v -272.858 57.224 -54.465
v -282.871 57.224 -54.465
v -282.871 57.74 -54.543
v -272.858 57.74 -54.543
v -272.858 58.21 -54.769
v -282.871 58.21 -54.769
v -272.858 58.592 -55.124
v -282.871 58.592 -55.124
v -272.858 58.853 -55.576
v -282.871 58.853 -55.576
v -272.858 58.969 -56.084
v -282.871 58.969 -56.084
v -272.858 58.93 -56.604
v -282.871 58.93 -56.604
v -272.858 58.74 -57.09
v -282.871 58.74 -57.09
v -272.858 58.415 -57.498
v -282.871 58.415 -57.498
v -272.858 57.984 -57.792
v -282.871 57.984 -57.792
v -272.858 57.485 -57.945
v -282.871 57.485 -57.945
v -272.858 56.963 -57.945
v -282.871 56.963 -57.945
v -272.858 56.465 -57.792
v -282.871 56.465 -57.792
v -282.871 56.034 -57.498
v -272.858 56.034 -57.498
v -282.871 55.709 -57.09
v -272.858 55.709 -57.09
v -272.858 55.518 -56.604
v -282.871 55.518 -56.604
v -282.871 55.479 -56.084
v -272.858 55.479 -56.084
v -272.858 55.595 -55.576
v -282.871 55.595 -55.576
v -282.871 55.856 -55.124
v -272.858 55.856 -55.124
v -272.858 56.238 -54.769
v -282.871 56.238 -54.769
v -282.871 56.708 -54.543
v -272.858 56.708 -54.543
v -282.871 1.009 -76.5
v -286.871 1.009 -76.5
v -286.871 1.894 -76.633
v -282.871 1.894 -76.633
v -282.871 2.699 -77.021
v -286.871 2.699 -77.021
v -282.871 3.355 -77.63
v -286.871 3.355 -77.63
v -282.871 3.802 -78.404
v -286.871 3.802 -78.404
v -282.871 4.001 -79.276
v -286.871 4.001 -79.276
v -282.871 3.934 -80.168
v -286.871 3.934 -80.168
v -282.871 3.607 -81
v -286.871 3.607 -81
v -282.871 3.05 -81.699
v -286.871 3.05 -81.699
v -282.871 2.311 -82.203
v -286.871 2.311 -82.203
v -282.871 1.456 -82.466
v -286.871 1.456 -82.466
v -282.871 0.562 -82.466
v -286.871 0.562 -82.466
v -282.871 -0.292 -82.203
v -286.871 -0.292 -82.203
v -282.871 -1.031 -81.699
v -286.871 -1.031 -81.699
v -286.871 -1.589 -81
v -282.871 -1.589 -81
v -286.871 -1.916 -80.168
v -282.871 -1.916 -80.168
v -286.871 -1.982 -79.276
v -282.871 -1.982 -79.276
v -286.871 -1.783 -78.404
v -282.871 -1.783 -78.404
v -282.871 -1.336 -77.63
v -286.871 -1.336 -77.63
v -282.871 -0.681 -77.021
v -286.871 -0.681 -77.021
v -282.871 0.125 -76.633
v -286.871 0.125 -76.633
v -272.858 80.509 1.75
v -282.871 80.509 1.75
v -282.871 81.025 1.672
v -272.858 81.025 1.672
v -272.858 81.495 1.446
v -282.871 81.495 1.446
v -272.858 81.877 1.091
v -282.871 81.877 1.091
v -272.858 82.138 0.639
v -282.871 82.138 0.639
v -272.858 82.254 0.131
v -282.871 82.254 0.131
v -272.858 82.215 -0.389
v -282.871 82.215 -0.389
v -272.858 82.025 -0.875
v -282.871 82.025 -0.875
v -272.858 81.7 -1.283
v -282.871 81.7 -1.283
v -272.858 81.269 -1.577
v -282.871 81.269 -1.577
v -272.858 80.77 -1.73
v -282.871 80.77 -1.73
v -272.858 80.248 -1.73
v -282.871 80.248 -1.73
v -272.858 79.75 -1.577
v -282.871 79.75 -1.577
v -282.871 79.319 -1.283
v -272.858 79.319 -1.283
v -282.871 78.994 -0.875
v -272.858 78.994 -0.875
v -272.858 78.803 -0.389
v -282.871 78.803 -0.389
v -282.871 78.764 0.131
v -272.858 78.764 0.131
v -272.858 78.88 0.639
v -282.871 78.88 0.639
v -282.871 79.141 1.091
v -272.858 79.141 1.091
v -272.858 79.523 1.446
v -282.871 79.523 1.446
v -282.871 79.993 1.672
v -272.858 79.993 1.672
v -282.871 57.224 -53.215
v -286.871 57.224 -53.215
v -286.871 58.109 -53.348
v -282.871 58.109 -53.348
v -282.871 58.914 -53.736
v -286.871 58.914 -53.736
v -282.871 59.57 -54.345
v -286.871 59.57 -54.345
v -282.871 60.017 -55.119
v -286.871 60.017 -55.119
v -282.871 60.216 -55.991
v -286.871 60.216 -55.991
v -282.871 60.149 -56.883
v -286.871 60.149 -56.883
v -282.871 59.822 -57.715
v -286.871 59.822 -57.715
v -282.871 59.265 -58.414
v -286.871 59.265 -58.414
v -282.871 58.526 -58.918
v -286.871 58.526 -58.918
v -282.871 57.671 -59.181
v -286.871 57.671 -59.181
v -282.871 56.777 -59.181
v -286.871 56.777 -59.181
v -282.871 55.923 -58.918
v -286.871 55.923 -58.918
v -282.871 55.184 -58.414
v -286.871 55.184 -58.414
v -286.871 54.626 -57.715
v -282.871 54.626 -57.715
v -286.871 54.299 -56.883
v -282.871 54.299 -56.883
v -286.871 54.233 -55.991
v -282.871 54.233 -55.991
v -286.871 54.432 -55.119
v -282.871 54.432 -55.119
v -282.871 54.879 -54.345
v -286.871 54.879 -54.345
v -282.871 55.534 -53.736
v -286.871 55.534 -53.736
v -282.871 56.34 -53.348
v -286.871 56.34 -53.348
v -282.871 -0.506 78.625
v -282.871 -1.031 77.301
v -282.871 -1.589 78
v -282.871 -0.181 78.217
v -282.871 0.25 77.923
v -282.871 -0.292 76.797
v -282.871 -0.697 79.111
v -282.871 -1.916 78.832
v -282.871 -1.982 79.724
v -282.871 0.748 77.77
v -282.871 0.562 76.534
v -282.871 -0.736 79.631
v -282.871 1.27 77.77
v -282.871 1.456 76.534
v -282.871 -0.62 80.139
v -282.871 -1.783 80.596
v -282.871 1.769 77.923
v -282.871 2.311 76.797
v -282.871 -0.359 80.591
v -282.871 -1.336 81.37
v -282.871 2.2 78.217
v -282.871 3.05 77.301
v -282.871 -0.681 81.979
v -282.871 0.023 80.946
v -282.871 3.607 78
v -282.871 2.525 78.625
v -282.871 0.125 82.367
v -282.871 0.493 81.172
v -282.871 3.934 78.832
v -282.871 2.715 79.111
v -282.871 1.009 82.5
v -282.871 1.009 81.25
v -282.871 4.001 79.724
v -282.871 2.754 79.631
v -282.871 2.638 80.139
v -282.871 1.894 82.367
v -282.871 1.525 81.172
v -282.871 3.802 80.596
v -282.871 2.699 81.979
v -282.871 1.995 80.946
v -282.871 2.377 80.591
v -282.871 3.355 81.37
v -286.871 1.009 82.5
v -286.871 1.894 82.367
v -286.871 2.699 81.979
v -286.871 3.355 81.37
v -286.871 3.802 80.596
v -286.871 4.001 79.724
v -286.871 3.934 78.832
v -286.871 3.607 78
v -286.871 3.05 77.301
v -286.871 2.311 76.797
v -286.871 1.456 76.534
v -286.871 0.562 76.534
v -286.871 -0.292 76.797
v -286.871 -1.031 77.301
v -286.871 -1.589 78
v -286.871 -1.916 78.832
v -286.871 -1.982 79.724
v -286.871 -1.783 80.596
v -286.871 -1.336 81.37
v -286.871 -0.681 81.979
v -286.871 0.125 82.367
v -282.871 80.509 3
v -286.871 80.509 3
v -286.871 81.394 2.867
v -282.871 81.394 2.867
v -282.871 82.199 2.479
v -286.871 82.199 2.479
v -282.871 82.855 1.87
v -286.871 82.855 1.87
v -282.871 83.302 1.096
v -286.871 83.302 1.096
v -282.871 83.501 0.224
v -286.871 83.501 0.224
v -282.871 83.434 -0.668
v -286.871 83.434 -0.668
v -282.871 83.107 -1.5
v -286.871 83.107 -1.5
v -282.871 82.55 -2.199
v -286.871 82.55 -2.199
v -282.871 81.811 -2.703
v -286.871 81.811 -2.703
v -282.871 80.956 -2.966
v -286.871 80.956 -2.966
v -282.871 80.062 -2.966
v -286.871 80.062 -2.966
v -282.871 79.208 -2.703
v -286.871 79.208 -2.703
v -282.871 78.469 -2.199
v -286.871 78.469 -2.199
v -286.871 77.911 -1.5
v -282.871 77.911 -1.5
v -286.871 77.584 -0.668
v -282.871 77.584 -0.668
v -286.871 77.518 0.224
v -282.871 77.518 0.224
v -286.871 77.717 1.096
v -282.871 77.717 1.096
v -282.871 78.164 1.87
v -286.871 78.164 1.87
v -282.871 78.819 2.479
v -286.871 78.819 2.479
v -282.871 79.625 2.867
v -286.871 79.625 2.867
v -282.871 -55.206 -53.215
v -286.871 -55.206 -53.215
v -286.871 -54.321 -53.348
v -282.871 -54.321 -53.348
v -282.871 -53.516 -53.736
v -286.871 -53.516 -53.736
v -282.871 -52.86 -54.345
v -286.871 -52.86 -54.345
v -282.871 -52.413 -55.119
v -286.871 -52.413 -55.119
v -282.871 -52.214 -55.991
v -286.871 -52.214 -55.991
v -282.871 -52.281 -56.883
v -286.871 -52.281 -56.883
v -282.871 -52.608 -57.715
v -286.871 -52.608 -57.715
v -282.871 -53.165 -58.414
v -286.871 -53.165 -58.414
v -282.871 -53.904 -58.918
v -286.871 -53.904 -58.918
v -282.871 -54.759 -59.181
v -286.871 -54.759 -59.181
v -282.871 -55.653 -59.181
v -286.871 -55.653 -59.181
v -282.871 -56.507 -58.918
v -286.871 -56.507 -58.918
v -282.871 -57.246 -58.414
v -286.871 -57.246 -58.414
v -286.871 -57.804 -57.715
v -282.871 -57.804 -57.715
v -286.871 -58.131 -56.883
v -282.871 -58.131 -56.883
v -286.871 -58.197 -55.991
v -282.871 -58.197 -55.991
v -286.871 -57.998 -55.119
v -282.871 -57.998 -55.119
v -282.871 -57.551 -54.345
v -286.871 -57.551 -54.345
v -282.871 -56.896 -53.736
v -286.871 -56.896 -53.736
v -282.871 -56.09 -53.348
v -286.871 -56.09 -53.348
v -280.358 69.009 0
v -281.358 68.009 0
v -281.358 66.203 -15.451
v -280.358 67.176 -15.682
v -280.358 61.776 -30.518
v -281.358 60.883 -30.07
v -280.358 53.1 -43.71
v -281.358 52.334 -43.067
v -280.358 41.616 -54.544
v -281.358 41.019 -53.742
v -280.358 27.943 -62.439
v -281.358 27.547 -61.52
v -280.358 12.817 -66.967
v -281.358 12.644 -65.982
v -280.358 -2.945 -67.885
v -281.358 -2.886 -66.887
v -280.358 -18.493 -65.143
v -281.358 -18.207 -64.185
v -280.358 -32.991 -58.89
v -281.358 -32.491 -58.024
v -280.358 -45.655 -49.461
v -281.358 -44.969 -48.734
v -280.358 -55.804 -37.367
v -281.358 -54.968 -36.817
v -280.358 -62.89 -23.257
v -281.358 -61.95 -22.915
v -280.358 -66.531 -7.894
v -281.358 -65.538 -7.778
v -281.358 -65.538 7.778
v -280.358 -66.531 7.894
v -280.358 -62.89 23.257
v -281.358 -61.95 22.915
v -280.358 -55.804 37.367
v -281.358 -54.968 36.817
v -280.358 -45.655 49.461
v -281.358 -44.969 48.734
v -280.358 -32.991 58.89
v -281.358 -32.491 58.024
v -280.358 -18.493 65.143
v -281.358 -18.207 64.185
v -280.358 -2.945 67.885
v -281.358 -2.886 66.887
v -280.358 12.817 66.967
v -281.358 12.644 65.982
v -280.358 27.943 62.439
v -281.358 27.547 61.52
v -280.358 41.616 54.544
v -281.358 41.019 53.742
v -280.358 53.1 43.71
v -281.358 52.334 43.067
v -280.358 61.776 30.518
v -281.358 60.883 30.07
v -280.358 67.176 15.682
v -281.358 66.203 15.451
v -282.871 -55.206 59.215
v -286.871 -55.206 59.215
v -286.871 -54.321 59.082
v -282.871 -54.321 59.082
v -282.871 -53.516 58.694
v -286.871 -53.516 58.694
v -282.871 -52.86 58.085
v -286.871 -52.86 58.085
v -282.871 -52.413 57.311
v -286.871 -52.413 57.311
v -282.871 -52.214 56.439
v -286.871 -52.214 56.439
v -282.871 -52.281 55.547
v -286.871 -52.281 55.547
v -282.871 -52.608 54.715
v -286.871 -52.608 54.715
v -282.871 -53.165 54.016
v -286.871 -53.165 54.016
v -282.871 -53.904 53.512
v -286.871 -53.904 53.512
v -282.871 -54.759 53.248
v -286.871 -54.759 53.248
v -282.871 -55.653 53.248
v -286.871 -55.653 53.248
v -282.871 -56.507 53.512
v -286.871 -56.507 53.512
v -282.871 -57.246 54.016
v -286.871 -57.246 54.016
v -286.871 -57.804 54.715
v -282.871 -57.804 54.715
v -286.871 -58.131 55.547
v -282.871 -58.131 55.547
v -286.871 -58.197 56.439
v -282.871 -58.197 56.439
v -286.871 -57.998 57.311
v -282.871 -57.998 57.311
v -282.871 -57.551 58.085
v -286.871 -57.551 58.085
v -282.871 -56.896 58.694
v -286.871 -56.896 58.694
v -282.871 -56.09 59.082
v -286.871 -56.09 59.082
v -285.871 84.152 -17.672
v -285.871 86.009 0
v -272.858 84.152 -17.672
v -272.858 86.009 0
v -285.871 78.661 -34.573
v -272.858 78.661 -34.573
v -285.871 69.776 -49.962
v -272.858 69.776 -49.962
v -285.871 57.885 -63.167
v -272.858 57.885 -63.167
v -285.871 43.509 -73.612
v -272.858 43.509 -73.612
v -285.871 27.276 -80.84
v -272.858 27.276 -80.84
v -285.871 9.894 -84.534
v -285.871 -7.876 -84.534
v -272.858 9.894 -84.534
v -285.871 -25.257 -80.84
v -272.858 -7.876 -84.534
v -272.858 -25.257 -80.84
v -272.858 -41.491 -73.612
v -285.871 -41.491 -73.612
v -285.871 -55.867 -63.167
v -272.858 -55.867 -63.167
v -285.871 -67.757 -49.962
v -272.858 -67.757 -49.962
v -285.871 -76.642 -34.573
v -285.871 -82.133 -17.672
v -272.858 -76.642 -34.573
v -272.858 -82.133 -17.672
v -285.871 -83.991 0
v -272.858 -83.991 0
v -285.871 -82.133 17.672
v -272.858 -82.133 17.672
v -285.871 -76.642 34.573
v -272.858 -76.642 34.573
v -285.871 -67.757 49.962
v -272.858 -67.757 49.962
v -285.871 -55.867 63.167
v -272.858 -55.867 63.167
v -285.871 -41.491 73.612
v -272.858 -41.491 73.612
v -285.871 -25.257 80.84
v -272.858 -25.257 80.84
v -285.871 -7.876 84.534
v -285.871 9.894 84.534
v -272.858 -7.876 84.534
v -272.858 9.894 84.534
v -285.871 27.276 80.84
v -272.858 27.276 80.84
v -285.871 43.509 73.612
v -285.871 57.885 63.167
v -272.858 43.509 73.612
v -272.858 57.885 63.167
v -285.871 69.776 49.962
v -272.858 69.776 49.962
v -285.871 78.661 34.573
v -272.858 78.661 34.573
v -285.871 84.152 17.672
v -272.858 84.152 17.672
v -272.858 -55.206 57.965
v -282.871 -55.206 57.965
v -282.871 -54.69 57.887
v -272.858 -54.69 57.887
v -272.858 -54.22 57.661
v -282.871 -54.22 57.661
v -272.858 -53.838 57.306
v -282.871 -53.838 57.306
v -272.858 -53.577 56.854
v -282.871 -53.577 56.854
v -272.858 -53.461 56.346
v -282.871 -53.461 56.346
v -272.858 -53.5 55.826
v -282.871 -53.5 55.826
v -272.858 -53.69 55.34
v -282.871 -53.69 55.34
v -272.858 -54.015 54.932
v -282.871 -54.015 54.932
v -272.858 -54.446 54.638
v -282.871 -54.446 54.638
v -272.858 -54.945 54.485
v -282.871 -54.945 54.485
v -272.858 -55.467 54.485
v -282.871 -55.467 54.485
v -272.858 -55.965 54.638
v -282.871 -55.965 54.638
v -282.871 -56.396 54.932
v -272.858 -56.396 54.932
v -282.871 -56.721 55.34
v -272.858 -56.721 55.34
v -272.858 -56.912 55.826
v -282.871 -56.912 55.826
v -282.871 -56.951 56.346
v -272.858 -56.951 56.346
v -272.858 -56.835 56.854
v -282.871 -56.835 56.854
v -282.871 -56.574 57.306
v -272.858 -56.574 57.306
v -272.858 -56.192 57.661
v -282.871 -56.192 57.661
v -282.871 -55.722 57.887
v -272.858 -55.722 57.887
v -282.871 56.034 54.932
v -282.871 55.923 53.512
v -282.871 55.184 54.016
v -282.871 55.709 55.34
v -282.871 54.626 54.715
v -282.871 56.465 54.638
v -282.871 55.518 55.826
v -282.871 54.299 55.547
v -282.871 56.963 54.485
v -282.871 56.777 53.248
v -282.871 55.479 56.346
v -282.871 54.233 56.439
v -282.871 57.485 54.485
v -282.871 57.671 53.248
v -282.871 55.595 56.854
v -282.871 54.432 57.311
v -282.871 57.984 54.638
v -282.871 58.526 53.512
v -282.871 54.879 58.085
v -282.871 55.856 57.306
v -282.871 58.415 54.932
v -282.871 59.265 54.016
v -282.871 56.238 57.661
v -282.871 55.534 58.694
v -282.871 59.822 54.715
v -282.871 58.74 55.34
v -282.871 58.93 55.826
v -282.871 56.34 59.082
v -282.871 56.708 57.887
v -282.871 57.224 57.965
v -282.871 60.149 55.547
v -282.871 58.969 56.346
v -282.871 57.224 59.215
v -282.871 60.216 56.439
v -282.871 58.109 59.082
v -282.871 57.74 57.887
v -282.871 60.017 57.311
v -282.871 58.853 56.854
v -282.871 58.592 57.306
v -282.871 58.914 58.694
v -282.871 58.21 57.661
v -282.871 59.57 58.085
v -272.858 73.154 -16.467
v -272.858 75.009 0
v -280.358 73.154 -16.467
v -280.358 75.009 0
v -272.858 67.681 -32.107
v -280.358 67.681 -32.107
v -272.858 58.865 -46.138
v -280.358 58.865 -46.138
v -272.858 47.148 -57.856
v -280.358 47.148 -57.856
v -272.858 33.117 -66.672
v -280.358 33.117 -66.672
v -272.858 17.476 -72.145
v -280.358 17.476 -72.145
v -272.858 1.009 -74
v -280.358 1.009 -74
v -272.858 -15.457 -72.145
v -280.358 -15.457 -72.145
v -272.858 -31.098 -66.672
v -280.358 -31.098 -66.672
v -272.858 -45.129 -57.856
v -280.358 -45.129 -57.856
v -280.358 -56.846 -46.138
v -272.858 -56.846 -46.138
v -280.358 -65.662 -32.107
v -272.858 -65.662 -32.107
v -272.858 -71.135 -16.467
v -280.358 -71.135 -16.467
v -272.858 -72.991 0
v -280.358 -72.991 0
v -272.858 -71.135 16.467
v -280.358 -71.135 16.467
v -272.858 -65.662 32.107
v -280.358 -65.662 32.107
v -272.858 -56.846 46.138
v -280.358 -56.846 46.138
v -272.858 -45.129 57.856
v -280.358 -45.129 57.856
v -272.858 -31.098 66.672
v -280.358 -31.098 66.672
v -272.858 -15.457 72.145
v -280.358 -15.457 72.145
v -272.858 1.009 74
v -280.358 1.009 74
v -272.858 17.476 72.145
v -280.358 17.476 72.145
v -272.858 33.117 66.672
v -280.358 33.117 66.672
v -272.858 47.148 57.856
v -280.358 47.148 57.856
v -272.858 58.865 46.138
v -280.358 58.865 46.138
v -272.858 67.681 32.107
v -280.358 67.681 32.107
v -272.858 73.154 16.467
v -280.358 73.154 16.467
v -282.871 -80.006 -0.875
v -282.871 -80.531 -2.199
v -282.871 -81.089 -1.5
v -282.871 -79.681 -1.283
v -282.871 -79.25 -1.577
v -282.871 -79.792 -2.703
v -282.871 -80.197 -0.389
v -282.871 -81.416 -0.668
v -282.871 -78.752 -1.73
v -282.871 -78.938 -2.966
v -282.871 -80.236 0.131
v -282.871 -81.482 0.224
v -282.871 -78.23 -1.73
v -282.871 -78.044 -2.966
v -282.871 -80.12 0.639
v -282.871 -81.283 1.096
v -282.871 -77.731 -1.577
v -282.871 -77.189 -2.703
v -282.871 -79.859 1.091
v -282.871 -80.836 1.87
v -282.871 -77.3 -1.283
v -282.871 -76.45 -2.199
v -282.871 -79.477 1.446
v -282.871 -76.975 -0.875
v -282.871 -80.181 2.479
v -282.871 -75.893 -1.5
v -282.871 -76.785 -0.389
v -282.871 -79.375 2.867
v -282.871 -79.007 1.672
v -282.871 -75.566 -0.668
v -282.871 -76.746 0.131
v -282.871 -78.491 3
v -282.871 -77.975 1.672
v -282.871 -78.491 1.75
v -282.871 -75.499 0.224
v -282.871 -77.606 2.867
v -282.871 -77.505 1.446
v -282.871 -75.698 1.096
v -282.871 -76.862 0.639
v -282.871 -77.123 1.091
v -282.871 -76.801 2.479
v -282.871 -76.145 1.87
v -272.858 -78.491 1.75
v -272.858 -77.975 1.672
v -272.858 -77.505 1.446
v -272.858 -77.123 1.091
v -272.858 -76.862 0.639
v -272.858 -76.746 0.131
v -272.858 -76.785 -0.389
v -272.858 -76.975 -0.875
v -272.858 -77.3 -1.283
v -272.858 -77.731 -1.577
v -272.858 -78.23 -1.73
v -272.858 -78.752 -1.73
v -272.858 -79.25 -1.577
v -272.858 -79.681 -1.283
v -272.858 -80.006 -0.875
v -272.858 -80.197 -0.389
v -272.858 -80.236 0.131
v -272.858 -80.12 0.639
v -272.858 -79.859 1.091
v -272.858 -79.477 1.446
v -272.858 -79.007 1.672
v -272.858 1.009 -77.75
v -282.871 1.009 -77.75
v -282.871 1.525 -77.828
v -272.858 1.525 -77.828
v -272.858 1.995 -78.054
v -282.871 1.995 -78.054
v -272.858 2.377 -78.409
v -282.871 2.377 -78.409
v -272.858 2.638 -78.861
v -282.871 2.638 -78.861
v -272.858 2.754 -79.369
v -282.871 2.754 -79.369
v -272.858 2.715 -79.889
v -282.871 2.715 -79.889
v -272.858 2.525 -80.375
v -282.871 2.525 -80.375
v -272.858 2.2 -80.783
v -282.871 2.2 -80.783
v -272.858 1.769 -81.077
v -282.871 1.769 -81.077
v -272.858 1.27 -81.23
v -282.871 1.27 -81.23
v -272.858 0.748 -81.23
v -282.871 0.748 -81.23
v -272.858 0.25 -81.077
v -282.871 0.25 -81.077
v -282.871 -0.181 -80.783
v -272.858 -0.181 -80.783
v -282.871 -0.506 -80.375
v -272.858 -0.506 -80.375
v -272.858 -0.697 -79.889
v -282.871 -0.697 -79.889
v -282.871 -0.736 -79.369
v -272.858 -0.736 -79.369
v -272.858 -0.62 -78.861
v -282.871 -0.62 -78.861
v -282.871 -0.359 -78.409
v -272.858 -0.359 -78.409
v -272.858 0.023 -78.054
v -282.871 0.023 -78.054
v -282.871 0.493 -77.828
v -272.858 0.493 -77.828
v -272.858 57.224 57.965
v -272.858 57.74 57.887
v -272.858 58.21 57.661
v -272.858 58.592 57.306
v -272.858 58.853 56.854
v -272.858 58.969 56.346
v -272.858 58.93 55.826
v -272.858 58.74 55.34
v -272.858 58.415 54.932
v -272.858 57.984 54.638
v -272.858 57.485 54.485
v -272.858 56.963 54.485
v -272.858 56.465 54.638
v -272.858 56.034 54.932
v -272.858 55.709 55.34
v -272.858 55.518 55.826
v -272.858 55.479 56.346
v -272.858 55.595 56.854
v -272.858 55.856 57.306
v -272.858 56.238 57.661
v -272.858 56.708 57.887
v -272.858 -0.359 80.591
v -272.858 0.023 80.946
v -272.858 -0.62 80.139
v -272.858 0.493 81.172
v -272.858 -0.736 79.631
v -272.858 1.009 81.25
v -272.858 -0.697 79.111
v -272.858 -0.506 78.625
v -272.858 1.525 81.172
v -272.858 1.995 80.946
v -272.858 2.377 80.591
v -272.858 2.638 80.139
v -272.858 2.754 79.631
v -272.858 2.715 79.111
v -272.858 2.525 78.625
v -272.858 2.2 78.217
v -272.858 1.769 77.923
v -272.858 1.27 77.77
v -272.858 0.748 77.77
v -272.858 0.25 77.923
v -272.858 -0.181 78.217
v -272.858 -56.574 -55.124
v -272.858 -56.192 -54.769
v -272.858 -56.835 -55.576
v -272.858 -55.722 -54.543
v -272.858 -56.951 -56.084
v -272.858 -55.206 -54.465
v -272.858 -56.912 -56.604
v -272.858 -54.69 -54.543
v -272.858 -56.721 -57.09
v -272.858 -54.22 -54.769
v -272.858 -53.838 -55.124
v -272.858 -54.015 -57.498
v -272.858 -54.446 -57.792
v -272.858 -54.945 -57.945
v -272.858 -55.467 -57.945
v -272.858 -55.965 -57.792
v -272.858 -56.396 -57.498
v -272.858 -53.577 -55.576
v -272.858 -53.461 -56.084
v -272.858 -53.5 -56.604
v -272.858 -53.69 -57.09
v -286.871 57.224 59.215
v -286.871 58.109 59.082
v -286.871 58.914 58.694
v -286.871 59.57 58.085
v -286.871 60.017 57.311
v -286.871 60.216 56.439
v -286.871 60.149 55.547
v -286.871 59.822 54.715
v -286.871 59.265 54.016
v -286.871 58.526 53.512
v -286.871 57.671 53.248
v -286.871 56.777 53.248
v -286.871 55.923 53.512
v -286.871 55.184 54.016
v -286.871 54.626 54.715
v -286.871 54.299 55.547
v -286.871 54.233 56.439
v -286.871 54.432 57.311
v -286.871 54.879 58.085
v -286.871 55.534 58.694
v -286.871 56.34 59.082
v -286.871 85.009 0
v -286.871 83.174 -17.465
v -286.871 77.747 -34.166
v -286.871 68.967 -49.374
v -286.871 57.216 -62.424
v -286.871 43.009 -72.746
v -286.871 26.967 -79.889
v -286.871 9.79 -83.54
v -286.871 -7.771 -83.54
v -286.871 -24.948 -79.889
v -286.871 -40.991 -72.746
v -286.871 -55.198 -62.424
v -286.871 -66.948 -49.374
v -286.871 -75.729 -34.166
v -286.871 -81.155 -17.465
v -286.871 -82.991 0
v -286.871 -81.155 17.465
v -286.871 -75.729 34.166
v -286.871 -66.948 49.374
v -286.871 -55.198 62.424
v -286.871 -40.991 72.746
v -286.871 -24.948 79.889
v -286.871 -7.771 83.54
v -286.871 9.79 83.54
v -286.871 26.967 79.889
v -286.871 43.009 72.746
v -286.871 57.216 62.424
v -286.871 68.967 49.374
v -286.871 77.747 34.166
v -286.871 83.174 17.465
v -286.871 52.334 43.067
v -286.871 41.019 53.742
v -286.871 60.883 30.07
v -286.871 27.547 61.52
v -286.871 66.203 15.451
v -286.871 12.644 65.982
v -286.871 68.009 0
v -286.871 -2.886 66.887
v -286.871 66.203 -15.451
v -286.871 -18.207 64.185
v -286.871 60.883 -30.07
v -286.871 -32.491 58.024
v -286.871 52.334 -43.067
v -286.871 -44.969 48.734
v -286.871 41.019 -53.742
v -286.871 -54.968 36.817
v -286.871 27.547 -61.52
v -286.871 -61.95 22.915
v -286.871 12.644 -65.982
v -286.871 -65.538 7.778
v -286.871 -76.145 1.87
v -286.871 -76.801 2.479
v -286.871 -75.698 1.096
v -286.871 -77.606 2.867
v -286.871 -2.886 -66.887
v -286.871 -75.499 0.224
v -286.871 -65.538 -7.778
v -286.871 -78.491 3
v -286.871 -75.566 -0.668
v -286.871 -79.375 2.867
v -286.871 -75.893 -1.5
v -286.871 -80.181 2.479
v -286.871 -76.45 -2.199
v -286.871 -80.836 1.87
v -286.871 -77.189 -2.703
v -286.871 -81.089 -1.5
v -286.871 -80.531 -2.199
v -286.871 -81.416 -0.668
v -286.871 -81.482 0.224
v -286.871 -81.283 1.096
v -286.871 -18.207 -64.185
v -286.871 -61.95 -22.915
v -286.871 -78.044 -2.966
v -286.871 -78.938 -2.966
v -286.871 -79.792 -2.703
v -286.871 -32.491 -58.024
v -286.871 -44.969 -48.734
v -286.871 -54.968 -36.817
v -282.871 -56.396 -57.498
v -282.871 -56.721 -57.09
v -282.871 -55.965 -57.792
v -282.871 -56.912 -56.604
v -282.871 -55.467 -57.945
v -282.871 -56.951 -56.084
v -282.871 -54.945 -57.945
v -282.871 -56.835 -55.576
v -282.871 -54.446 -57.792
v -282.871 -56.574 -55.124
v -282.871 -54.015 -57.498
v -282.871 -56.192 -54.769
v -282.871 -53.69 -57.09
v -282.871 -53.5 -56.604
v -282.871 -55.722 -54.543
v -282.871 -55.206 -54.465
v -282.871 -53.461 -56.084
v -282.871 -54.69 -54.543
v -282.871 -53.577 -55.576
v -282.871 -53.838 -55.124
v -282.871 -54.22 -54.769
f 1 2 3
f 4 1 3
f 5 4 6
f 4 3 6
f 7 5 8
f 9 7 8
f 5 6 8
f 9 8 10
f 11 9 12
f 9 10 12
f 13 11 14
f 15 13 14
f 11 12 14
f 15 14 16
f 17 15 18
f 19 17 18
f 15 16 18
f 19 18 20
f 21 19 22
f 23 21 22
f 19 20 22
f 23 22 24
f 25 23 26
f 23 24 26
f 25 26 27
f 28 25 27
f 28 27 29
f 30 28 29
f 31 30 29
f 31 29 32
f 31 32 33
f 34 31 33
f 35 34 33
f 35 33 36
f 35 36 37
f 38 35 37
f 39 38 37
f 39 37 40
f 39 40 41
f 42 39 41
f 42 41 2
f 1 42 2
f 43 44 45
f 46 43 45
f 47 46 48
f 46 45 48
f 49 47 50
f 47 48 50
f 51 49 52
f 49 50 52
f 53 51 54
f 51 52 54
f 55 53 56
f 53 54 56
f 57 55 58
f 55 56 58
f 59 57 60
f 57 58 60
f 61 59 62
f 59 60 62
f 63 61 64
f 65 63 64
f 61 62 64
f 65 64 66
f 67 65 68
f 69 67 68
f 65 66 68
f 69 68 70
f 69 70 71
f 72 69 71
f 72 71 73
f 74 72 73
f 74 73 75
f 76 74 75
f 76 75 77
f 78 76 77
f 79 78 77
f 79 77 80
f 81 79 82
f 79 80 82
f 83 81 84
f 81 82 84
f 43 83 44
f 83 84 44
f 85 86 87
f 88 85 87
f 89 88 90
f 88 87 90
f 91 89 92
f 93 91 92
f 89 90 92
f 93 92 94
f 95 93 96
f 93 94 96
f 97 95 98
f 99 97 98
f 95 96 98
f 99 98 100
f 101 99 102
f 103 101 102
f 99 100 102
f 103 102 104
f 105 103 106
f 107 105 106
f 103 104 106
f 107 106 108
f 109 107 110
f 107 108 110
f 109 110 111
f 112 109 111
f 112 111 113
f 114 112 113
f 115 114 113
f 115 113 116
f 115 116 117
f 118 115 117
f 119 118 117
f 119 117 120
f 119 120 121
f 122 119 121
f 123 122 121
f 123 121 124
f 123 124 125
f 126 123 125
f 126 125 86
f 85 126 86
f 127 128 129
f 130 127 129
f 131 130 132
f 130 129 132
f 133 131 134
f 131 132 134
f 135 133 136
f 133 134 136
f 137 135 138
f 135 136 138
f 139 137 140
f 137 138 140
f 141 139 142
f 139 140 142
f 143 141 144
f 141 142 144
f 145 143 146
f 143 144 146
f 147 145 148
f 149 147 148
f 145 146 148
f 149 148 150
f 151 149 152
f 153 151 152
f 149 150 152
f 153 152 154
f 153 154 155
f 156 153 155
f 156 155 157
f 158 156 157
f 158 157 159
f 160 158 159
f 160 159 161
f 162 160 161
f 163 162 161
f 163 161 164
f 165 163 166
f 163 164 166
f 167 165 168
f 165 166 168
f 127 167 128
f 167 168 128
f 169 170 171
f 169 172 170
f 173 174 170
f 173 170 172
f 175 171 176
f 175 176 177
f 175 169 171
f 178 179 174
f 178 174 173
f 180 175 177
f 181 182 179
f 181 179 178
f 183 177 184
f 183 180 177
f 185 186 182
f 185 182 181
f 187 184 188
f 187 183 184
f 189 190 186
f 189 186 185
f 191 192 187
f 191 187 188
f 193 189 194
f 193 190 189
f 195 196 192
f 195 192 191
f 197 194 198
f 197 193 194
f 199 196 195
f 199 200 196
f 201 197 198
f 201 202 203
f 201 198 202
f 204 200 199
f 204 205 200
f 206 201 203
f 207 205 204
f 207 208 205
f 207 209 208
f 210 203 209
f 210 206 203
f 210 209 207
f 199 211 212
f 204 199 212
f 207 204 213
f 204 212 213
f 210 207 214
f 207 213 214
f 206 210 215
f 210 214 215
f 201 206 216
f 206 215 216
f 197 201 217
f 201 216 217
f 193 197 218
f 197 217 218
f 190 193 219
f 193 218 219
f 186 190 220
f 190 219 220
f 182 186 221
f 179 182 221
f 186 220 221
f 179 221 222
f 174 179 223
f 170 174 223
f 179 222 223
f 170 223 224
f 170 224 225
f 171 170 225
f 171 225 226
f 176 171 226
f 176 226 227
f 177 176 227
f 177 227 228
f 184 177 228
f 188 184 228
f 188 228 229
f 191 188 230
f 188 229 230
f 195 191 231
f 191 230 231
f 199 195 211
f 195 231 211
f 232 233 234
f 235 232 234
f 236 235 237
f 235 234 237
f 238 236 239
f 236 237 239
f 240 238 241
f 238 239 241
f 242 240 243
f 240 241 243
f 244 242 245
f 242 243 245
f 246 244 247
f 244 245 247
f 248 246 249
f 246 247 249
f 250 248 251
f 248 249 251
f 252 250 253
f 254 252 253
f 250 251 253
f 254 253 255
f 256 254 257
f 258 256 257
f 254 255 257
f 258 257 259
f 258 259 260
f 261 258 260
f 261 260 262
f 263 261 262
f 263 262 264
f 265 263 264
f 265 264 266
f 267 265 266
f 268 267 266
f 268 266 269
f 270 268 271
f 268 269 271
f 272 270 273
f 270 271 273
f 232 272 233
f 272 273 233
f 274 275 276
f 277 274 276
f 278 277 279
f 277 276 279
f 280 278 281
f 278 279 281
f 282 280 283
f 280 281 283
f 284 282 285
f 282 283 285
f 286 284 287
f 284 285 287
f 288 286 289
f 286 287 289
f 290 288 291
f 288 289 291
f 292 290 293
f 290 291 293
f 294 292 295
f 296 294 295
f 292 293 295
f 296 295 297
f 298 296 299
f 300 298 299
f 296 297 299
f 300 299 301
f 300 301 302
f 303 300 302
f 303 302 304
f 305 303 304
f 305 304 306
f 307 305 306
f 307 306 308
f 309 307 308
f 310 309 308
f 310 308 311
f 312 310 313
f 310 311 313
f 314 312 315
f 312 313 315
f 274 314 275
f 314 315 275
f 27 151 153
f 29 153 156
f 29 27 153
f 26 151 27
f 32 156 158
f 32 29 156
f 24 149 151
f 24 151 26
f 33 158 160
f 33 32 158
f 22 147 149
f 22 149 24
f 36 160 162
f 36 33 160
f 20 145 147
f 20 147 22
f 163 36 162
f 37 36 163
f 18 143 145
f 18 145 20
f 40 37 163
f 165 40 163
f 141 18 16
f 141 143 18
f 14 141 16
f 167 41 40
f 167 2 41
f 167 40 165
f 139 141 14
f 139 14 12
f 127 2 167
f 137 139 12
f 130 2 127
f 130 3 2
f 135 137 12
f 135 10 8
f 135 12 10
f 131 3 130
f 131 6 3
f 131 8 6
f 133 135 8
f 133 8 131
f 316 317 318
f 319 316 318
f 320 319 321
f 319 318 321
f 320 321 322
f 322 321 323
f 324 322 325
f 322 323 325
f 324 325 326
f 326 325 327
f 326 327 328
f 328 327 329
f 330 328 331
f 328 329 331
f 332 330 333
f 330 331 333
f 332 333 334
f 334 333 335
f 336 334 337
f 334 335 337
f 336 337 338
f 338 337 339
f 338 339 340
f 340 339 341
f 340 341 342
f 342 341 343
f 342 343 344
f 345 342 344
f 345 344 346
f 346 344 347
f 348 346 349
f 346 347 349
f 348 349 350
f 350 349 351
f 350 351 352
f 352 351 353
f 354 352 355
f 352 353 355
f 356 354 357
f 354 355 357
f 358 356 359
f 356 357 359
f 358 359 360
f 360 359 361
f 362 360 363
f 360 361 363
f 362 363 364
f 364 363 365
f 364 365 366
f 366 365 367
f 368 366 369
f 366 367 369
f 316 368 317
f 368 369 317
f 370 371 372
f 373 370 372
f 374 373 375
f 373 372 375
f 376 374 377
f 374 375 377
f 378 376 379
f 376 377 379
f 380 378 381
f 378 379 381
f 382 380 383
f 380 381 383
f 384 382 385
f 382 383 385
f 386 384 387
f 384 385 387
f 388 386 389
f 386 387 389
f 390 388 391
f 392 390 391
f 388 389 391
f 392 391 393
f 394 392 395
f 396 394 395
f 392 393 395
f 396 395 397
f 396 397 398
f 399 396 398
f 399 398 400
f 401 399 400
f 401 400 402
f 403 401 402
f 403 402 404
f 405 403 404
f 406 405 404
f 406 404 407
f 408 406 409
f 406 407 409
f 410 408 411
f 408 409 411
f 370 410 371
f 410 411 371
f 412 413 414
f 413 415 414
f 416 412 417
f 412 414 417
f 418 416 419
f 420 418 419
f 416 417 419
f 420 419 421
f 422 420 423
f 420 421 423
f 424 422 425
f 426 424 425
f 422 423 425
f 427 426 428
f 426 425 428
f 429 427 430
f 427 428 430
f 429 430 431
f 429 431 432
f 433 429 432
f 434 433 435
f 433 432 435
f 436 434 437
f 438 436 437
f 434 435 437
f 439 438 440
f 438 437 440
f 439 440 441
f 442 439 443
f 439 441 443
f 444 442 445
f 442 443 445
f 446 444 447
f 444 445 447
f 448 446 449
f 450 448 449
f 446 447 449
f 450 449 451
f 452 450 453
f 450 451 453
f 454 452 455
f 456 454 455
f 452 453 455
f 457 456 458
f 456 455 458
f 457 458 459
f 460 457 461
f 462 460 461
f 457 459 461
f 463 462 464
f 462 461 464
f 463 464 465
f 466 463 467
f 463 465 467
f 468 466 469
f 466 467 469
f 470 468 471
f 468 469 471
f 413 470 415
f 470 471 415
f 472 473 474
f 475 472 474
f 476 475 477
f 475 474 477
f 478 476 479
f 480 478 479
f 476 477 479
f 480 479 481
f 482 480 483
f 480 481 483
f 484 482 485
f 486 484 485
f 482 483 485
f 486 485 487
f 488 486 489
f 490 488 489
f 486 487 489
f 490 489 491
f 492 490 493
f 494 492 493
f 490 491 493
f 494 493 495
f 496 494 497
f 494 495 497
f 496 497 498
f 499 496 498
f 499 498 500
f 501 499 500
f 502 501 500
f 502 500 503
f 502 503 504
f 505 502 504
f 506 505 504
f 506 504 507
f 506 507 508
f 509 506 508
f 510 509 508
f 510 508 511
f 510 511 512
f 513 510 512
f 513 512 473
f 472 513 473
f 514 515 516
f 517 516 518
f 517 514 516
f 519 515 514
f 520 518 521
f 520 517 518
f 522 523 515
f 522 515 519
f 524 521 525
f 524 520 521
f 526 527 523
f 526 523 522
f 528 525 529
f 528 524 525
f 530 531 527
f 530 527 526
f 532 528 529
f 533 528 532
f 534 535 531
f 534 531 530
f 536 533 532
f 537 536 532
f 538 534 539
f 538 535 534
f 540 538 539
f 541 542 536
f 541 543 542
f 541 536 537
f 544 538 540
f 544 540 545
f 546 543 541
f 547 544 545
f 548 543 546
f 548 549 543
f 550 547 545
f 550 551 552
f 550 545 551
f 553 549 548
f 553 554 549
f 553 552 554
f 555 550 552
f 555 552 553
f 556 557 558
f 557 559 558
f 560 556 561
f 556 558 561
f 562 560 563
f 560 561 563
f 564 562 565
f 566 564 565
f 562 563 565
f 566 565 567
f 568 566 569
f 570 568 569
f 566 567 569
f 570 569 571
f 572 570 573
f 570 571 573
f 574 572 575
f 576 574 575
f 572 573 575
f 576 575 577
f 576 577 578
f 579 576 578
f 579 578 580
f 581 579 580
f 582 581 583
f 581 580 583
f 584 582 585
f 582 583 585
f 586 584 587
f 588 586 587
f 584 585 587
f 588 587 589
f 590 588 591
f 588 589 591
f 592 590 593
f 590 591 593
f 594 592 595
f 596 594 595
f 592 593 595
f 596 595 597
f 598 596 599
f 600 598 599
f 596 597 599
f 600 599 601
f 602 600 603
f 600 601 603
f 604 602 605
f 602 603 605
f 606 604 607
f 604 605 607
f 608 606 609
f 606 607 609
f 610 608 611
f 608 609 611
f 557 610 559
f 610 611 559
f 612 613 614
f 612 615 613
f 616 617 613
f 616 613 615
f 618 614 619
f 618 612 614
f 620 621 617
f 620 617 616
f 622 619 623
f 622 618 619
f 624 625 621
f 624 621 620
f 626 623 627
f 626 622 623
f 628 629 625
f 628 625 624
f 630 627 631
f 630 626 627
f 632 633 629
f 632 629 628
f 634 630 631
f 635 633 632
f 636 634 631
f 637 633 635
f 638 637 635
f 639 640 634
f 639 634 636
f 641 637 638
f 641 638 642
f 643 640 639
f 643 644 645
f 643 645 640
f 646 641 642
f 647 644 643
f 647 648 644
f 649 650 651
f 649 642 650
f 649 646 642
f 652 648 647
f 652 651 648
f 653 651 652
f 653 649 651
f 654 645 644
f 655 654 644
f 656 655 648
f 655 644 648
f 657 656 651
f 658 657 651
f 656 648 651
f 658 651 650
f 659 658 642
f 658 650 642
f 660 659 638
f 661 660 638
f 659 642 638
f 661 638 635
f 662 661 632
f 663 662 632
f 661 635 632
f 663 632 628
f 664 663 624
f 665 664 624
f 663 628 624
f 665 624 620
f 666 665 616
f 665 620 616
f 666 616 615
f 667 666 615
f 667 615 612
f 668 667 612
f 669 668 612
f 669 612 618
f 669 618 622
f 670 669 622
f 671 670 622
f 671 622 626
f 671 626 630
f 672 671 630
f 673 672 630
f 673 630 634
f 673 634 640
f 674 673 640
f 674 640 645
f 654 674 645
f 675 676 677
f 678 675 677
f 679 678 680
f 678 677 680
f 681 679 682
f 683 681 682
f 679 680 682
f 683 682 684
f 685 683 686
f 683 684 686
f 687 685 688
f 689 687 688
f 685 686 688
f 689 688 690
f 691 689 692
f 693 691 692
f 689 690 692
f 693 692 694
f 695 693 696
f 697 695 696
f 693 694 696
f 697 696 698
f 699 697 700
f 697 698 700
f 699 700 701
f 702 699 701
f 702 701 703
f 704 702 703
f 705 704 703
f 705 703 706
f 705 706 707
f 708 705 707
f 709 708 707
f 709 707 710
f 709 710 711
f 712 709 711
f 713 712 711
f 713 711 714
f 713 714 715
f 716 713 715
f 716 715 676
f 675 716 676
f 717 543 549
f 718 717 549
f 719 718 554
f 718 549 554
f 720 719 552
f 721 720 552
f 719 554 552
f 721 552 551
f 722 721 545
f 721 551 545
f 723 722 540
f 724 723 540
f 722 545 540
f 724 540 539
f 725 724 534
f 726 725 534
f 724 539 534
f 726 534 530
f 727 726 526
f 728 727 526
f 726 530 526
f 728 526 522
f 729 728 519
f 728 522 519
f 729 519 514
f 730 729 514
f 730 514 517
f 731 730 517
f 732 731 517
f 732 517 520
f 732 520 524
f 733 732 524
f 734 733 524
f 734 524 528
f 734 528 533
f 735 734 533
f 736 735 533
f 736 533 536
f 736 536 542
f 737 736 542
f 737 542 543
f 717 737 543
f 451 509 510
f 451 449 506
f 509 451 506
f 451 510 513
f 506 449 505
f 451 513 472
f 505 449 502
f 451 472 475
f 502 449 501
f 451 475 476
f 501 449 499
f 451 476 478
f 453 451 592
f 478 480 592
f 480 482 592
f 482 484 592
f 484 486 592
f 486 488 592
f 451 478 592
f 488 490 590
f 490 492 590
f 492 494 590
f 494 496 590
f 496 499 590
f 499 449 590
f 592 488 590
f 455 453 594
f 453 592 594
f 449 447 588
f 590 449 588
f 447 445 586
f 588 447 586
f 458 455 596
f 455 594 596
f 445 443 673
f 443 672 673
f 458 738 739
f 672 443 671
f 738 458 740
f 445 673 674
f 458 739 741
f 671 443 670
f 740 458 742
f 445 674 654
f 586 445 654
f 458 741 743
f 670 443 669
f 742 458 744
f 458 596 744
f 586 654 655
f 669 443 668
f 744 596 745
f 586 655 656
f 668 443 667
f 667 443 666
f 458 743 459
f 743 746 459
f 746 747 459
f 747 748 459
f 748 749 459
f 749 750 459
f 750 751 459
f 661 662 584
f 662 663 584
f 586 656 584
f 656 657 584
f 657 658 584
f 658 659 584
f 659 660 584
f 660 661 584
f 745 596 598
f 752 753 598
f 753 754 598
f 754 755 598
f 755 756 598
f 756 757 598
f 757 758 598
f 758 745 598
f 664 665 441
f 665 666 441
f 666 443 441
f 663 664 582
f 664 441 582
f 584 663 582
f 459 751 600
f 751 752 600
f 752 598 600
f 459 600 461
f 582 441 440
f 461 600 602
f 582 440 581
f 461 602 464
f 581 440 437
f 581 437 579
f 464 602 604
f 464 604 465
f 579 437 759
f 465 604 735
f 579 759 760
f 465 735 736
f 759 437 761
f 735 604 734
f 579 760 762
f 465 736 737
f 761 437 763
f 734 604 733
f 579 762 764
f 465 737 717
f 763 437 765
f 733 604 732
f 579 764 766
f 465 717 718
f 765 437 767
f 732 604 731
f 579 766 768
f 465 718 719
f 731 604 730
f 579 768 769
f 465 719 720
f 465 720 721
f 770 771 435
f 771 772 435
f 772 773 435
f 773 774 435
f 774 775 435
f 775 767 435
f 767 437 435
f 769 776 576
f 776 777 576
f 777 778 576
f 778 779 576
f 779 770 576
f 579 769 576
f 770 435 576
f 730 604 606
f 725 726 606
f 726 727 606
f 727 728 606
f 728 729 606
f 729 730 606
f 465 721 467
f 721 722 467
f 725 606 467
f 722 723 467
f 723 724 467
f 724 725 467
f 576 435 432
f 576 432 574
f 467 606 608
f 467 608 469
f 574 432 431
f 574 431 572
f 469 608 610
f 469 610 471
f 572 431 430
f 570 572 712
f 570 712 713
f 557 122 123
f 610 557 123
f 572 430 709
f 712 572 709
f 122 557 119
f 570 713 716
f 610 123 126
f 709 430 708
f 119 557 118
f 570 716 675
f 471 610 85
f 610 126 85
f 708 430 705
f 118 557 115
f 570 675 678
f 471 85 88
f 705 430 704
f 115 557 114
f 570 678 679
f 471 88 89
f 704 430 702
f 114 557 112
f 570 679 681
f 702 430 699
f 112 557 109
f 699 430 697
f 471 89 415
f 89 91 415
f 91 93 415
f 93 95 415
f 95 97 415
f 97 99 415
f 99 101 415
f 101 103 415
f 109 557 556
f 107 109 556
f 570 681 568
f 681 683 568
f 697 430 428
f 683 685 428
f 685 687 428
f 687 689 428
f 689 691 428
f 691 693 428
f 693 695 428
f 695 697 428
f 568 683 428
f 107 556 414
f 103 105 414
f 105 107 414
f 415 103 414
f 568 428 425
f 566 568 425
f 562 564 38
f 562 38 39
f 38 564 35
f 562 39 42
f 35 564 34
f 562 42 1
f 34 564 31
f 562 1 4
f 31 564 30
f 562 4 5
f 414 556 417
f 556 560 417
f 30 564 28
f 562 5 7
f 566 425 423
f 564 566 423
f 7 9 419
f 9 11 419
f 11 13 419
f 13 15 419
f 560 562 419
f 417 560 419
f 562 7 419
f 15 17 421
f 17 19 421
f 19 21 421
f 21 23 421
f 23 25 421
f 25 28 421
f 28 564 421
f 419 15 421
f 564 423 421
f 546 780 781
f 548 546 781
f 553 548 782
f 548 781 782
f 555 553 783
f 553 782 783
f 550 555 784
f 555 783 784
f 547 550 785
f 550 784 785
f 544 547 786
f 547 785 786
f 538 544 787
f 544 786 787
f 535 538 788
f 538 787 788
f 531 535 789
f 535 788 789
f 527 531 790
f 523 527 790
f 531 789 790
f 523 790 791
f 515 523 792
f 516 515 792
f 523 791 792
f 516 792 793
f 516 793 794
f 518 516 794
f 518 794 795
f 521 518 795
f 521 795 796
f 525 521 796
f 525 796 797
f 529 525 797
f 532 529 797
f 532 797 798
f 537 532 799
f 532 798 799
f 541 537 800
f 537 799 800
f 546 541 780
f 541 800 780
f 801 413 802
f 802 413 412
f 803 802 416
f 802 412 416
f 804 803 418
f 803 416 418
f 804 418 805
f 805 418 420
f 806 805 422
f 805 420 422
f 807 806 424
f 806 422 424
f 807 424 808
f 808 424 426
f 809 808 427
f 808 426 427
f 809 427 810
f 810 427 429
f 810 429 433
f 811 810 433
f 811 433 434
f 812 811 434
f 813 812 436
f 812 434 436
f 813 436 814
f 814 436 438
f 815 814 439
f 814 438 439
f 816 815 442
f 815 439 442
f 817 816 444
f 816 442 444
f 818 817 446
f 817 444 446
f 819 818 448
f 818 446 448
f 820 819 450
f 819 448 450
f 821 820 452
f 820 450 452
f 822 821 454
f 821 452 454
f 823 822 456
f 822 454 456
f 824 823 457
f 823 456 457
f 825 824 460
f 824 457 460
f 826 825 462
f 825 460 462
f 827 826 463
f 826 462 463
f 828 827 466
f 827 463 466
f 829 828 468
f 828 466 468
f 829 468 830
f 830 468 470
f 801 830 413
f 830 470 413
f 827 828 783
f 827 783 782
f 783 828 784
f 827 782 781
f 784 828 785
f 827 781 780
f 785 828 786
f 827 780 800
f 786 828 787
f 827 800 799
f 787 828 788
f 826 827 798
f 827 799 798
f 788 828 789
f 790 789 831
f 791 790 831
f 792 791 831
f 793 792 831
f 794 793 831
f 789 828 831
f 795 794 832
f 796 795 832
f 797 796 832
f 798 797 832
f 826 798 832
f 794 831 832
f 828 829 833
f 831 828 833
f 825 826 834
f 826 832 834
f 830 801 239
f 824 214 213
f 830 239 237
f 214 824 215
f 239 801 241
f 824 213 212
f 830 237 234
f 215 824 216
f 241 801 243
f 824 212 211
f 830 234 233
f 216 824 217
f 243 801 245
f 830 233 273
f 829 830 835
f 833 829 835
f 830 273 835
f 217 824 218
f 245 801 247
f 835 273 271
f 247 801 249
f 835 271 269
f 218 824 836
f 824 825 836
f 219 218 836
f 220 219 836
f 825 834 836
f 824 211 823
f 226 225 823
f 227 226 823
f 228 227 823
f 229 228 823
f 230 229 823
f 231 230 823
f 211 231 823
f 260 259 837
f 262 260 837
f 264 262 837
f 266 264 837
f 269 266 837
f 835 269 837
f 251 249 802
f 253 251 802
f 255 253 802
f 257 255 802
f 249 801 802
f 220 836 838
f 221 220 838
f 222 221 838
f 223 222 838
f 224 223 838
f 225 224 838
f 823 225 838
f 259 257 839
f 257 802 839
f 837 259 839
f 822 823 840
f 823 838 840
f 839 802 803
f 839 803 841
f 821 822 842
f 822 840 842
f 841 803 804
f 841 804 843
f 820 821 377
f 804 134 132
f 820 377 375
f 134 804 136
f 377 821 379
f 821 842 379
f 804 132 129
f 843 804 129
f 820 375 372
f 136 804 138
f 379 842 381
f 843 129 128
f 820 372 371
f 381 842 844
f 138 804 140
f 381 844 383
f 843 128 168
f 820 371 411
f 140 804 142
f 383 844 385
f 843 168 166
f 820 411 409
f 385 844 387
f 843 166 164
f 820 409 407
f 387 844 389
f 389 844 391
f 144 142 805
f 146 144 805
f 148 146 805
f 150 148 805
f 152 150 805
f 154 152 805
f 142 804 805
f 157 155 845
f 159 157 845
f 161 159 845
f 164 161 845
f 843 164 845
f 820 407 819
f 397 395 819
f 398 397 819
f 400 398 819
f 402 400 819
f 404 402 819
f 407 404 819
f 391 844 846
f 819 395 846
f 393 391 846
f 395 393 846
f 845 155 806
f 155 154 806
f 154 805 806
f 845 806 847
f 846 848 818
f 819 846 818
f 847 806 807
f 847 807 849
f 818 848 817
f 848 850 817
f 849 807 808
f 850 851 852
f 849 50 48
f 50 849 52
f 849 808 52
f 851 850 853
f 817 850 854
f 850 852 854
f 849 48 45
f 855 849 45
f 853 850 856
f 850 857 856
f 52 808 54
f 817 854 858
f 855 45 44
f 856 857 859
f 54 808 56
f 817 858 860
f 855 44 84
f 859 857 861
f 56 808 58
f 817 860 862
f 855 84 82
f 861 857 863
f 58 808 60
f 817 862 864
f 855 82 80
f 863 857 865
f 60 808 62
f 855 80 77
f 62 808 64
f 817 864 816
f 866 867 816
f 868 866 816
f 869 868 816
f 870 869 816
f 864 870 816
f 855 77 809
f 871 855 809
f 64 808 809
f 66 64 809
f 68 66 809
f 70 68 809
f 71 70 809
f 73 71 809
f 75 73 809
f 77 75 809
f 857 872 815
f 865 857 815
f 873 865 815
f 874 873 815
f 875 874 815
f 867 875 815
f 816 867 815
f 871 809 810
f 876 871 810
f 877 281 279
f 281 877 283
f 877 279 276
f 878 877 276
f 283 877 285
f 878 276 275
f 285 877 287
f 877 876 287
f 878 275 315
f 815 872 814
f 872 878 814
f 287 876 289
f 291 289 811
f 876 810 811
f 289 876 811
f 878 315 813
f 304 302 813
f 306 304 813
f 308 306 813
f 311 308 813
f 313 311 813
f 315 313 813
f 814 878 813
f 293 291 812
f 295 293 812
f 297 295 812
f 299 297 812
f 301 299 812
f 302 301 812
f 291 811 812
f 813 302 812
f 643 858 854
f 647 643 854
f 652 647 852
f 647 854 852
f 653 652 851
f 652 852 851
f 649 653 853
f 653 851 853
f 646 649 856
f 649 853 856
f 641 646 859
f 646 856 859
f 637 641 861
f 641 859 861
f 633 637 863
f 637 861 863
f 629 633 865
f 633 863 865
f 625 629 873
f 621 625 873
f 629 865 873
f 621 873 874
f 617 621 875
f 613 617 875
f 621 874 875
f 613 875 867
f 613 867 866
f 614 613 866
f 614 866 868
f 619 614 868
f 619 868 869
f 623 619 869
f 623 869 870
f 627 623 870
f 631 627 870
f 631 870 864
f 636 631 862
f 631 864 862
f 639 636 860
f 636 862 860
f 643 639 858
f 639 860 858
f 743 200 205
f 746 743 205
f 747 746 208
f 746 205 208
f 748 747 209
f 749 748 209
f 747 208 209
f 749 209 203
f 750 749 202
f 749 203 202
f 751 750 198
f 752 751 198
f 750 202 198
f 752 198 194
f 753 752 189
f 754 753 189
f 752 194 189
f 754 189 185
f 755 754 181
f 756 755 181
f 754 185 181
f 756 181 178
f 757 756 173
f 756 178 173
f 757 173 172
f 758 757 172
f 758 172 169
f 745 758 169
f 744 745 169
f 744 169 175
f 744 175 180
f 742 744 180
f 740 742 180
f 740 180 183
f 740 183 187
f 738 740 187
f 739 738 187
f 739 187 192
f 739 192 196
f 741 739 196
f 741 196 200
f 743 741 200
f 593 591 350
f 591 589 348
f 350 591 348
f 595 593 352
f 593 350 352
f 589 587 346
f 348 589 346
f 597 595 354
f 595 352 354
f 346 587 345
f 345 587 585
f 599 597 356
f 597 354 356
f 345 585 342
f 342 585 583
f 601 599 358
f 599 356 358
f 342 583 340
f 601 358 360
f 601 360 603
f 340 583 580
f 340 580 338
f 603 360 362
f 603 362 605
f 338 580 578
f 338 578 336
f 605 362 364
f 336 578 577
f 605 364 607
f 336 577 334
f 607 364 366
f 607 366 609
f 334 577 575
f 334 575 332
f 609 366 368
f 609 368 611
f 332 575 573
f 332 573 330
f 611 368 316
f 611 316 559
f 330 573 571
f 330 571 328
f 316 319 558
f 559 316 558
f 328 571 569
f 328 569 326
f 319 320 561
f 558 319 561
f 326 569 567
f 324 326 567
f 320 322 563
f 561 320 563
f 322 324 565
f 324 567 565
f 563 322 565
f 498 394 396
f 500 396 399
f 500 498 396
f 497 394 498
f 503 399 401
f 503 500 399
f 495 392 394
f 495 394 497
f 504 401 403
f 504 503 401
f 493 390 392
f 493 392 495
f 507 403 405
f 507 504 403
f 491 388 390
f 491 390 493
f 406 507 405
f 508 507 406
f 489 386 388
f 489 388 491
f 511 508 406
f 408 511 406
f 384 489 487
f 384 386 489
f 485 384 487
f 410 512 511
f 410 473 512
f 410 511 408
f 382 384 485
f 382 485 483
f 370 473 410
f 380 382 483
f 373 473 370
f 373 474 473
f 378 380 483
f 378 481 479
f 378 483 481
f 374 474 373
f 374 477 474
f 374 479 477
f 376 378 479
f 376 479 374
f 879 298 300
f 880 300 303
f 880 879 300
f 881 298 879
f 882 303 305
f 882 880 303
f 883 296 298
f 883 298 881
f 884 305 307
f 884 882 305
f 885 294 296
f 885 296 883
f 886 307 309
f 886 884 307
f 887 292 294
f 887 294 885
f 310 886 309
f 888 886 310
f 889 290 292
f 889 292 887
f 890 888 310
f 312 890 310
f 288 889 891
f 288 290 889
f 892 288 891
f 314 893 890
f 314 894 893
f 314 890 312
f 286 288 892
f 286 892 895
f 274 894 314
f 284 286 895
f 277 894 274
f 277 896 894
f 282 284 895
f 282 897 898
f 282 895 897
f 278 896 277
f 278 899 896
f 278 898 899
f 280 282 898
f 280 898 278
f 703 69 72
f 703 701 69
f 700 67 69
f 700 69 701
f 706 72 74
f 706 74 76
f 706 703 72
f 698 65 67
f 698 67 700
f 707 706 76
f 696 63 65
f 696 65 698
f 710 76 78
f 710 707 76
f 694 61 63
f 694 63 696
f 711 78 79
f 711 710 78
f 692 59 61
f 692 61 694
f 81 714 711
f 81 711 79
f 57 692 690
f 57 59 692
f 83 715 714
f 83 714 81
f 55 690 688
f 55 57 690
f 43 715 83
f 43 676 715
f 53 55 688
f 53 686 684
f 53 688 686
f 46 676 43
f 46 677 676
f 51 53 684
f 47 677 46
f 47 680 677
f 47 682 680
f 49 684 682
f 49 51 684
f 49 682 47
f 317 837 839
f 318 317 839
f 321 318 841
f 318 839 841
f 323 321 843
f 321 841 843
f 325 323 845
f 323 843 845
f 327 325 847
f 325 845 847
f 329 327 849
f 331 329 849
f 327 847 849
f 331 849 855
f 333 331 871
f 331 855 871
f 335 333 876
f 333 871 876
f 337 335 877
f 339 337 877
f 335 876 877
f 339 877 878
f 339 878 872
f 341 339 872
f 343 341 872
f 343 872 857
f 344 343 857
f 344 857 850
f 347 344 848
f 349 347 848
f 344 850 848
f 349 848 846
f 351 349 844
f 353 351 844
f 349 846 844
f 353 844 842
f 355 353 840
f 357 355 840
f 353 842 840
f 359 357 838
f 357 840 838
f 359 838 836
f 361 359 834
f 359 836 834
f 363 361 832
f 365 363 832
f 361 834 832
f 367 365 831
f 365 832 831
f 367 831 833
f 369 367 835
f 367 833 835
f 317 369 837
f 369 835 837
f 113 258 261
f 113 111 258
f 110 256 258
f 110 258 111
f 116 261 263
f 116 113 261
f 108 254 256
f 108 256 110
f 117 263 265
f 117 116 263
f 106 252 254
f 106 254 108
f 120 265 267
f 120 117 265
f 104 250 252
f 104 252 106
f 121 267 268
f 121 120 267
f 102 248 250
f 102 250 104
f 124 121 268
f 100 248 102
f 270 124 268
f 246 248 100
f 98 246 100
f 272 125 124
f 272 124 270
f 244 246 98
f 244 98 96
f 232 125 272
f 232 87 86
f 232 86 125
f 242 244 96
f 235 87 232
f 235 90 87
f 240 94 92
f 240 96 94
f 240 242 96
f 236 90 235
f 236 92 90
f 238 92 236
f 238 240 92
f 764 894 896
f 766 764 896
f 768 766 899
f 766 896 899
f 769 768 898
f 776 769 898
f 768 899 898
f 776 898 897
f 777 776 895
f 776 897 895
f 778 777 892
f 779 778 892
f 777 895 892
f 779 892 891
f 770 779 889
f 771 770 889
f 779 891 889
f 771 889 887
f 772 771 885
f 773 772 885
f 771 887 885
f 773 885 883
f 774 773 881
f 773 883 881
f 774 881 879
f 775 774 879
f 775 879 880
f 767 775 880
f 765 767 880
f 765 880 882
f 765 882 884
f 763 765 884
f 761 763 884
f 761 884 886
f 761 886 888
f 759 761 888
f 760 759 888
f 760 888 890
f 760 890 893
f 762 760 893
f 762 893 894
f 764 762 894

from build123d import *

# Parameters (mm, degrees)
SZKIC2_R                   = 1.75
WYTNIJ_WYCI_GNI_CIE1_DEPTH = 15.013168353
SZKIC4_R                   = 3
WYTNIJ_WYCI_GNI_CIE2_DEPTH = 4
SFAZOWANIE1_SIZE           = 1


with BuildPart() as part:
    # Szkic1 → Obrót1 (revolve)
    with BuildSketch(Plane.XY):
        Polygon((-272.858046523, 75.009269975), (-280.358046523, 75.009269975), (-280.358046523, 68.009269975), (-286.871214876, 68.009269975), (-286.871214876, 85.009269975), (-285.871214876, 86.009269975), (-272.858046523, 86.009269975), align=None)
    revolve(axis=Axis((-268.908046523, 1.009269975, 0), (-1, 0, 0)))

    # Szkic2 → Wytnij-wyciągnięcie1 (cut, through all)
    with BuildSketch(Plane.ZY.offset(286.871214876)):
        with Locations((79.5, 1.009269975)):
            Circle(SZKIC2_R)
        with Locations((56.214989104, -55.20571913)):
            Circle(SZKIC2_R)
        with Locations((0, -78.490730025)):
            Circle(SZKIC2_R)
        with Locations((-56.214989104, -55.20571913)):
            Circle(SZKIC2_R)
        with Locations((-79.5, 1.009269975)):
            Circle(SZKIC2_R)
        with Locations((-56.214989104, 57.224259079)):
            Circle(SZKIC2_R)
        with Locations((0, 80.509269975)):
            Circle(SZKIC2_R)
        with Locations((56.214989104, 57.224259079)):
            Circle(SZKIC2_R)
    extrude(amount=-WYTNIJ_WYCI_GNI_CIE1_DEPTH, mode=Mode.SUBTRACT)

    # Szkic4 → Wytnij-wyciągnięcie2 (cut)
    with BuildSketch(Plane.ZY.offset(286.871214876)):
        with Locations((79.5, 1.009269975)):
            Circle(SZKIC4_R)
        with Locations((56.214989104, -55.20571913)):
            Circle(SZKIC4_R)
        with Locations((0, -78.490730025)):
            Circle(SZKIC4_R)
        with Locations((-56.214989104, -55.20571913)):
            Circle(SZKIC4_R)
        with Locations((-79.5, 1.009269975)):
            Circle(SZKIC4_R)
        with Locations((-56.214989104, 57.224259079)):
            Circle(SZKIC4_R)
        with Locations((0, 80.509269975)):
            Circle(SZKIC4_R)
        with Locations((56.214989104, 57.224259079)):
            Circle(SZKIC4_R)
    extrude(amount=-WYTNIJ_WYCI_GNI_CIE2_DEPTH, mode=Mode.SUBTRACT)

    # Sfazowanie1
    sfazowanie1_edges = [part.edges().sort_by_distance(p)[0] for p in [
        (-280.358046523, -65.990730025, 0),
    ]]
    chamfer(sfazowanie1_edges, length=SFAZOWANIE1_SIZE)


solid = part.part
